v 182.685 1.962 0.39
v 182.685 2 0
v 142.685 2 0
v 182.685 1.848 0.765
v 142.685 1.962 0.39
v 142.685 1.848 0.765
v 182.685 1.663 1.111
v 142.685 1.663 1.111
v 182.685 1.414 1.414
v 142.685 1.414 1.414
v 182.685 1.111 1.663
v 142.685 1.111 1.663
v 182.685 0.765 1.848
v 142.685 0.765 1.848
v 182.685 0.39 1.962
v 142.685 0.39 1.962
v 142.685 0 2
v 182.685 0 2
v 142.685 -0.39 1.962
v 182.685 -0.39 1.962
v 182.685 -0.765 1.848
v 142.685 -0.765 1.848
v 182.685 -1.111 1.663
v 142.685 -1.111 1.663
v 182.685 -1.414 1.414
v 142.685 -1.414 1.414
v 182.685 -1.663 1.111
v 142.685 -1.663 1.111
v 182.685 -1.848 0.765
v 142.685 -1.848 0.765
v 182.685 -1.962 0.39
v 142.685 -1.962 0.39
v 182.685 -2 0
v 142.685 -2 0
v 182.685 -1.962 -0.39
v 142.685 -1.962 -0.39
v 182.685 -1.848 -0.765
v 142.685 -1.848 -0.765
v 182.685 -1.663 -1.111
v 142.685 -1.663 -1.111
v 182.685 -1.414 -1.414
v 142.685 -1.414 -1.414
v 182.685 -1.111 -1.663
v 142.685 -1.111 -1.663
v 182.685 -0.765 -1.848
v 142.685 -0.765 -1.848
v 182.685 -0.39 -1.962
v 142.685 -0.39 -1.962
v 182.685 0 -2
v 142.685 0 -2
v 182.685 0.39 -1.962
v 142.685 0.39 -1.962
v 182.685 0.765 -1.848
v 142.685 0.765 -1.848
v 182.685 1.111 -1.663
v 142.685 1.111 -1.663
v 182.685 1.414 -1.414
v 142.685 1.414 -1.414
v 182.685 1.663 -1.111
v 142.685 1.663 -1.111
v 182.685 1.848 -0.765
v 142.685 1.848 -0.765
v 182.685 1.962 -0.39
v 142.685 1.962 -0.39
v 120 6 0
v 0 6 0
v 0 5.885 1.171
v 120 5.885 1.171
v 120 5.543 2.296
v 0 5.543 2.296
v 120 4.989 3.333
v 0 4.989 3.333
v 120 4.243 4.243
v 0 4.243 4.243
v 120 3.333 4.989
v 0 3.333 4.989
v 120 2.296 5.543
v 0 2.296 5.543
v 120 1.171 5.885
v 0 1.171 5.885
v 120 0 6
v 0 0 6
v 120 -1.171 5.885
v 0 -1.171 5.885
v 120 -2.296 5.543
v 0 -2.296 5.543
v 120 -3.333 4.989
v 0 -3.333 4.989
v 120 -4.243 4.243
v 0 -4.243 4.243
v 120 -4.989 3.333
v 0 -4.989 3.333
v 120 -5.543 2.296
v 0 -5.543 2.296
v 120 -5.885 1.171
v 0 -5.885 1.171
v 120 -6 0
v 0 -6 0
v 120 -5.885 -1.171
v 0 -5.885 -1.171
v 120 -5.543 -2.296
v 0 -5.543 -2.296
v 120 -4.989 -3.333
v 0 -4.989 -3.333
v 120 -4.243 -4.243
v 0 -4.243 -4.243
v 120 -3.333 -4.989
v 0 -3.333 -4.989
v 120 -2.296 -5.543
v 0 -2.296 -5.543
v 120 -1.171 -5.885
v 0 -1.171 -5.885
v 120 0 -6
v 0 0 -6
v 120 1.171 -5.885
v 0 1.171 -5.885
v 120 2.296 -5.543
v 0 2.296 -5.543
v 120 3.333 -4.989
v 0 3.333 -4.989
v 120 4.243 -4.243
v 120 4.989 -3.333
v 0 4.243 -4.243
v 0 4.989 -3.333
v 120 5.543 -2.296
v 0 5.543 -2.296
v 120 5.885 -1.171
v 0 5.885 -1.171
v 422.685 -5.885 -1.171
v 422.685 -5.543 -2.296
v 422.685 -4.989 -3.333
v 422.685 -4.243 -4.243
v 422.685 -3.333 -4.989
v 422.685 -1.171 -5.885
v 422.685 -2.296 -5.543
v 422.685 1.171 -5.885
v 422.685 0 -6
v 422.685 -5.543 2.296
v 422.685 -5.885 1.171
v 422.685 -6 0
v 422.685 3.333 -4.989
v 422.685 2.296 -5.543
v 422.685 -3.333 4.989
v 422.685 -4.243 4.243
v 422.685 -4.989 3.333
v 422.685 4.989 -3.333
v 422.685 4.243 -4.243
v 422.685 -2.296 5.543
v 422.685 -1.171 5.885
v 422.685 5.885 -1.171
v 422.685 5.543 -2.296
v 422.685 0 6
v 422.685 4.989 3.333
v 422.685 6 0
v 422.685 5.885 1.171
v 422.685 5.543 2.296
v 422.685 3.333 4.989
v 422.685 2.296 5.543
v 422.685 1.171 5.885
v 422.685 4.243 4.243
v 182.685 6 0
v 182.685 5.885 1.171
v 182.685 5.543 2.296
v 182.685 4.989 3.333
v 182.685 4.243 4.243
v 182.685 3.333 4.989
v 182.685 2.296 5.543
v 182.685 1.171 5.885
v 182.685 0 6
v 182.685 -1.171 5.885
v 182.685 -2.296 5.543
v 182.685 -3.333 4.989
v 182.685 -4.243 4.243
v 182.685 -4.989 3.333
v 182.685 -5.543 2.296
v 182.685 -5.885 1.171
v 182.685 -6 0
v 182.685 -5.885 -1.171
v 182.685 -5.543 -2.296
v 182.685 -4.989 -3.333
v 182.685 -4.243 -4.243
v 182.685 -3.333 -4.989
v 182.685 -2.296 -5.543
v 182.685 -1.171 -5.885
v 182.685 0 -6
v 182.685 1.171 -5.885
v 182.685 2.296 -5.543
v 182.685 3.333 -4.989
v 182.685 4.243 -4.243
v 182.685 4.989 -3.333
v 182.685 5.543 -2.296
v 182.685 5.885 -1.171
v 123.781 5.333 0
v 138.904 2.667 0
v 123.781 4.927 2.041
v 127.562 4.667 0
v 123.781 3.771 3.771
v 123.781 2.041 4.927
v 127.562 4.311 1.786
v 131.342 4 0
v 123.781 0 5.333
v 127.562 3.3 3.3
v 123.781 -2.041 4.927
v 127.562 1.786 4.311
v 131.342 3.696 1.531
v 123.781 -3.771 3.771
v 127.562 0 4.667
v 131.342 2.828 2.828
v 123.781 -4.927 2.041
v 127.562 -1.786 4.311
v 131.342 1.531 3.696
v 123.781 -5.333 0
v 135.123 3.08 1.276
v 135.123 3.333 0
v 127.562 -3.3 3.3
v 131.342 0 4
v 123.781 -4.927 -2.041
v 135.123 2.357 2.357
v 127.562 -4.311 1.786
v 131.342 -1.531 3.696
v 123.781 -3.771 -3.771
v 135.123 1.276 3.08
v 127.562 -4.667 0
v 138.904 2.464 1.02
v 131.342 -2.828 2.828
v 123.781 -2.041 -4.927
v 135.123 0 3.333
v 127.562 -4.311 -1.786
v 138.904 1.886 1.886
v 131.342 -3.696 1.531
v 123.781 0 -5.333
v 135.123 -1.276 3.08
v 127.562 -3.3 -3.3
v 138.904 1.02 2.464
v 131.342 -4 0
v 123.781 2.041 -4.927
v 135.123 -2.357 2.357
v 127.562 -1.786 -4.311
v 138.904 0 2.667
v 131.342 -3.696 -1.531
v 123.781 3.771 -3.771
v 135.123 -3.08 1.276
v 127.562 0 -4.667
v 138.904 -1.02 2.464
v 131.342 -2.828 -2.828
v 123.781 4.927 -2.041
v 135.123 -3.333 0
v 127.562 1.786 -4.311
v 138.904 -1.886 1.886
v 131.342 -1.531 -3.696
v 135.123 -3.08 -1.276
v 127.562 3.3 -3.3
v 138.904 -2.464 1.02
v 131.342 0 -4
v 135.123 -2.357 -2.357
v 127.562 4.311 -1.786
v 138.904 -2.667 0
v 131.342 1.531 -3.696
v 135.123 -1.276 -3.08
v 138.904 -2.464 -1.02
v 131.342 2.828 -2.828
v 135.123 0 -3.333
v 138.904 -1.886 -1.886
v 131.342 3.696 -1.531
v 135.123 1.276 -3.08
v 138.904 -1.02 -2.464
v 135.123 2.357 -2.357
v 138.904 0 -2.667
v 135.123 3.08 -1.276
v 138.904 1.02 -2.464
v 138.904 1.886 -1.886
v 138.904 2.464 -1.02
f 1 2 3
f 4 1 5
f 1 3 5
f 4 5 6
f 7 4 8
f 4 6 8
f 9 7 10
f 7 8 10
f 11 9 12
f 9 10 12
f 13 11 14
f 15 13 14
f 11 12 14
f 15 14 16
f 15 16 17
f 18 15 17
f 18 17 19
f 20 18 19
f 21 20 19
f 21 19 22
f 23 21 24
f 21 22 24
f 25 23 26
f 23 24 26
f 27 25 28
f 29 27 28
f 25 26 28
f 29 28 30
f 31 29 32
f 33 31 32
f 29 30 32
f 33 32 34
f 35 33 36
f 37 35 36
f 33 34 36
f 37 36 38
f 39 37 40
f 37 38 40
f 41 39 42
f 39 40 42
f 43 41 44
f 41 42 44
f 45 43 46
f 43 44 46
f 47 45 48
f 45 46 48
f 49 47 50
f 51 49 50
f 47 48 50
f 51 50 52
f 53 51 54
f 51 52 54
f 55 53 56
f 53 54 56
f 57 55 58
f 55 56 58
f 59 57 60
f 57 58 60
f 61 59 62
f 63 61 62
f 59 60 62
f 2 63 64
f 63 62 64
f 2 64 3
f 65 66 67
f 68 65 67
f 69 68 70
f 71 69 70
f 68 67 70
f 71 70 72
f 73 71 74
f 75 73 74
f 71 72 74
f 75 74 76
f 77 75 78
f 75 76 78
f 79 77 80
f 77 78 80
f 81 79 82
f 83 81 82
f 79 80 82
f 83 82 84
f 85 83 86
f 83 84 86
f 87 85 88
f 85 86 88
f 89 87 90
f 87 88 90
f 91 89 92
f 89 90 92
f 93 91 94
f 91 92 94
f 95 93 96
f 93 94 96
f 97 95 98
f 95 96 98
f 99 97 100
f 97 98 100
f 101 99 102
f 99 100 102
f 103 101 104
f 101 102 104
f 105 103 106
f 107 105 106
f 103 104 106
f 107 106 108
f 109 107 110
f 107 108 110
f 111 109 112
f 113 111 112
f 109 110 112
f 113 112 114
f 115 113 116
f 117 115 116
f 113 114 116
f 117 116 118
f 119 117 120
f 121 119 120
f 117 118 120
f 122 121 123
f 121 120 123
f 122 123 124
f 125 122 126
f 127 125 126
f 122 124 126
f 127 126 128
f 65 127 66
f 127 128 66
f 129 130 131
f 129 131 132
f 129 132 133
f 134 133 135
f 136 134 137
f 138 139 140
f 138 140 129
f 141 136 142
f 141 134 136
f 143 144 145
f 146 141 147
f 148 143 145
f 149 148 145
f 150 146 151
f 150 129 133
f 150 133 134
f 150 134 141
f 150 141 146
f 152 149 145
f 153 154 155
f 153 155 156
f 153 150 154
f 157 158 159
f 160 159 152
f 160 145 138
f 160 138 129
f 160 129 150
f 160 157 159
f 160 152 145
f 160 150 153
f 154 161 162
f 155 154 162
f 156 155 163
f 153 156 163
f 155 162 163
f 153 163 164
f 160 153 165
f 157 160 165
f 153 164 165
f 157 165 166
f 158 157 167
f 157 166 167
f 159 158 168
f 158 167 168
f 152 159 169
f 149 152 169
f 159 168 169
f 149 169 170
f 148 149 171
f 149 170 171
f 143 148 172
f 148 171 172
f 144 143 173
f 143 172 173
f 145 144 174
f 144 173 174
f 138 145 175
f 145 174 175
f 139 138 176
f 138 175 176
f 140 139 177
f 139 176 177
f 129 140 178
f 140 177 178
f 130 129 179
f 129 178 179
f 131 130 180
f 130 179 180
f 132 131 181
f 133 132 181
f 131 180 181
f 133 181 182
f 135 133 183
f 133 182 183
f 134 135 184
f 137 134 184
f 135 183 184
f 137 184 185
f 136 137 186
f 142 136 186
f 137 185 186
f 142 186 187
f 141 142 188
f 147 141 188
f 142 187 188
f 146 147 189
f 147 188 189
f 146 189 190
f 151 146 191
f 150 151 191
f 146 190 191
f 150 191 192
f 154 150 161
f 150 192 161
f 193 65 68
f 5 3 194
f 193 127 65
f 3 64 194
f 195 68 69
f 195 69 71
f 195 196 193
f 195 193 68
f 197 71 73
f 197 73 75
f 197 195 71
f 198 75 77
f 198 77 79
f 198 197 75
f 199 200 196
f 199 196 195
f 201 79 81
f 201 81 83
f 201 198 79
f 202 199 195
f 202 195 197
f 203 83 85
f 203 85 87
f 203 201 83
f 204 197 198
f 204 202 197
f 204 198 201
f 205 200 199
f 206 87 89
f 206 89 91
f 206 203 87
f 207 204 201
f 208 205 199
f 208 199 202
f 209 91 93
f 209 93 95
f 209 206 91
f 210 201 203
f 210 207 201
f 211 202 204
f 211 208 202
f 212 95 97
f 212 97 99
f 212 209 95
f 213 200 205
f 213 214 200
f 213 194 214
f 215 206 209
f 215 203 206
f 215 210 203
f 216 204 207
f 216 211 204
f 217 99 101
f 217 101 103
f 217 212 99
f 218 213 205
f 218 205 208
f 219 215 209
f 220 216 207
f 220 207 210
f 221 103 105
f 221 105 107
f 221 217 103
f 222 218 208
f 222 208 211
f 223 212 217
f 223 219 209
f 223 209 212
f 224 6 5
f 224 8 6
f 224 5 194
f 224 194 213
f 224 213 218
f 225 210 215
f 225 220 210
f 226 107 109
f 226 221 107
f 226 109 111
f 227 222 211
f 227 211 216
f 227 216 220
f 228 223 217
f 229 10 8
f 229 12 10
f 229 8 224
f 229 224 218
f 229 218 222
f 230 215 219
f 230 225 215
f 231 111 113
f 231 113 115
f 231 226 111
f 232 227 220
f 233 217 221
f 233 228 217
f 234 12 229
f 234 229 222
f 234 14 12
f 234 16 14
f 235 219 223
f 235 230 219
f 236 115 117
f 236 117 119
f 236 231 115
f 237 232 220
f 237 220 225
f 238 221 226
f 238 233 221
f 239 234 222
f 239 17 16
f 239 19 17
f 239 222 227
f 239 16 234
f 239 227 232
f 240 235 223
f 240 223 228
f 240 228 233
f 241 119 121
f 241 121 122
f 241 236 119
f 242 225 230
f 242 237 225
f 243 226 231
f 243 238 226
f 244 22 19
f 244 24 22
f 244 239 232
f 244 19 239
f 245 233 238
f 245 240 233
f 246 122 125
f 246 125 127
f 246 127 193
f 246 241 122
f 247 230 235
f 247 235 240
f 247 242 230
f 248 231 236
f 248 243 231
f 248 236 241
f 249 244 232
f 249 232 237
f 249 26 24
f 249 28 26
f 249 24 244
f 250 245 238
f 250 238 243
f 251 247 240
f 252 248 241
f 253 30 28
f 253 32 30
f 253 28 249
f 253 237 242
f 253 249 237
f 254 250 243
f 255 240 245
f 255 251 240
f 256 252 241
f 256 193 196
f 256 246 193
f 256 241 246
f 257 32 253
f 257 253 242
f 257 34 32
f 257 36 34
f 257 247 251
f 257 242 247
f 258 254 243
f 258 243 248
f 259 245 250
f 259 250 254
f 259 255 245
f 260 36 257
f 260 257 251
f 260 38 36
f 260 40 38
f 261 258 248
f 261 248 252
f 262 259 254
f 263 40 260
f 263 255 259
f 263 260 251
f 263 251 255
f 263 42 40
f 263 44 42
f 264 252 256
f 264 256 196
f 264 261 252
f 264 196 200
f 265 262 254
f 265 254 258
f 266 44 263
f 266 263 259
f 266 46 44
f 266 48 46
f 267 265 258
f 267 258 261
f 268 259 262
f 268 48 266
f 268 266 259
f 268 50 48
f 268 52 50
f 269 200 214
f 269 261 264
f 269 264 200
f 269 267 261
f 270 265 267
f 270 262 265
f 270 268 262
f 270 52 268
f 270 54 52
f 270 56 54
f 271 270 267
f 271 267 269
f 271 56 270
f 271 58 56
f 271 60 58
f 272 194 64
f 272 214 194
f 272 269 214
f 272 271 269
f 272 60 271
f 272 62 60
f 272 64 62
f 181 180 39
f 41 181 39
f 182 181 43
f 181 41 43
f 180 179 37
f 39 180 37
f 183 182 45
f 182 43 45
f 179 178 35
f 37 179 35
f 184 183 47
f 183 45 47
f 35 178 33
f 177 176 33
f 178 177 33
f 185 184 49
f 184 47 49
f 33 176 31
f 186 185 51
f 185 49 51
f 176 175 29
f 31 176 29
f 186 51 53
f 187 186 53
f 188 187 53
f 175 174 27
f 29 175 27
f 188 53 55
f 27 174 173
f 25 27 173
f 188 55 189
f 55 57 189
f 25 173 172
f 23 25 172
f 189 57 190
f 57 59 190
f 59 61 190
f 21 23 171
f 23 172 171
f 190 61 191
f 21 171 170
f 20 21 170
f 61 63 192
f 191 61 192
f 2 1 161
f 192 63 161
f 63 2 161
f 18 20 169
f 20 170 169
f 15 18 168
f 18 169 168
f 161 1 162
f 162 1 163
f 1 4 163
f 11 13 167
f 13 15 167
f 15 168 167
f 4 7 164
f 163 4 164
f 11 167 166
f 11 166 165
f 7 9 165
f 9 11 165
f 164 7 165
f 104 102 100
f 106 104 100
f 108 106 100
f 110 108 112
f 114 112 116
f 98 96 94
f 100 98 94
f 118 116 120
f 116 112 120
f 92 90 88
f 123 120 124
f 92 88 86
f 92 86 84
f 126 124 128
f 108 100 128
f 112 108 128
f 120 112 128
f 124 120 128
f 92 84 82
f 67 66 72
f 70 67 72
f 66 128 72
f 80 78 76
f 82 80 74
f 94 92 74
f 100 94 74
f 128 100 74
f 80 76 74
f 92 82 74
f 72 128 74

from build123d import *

# Parameters (mm, degrees)
F0_R      = 6
F1_DEPTH  = 120
F1_FACE_R = 6
F3_R      = 2
F5_R      = 2
F6_DEPTH  = 40
F8_R      = 6
F9_DEPTH  = 240


with BuildPart() as f1:
    # F0 (on Right) → F1 (new body)
    with BuildSketch(Plane.YZ):
        Circle(F0_R)
    extrude(amount=F1_DEPTH)

    # F1_face (on face) → F4 section 0
    with BuildSketch(Plane.YZ.offset(120)):
        Circle(F1_FACE_R)
    # F3 (on offset) → F4 section 1
    with BuildSketch(Plane.YZ.offset(142.685)):
        Circle(F3_R)
    loft()

    # F5 (on offset) → F6 (join)
    with BuildSketch(Plane.YZ.offset(142.685)):
        Circle(F5_R)
    extrude(amount=F6_DEPTH)

    # F8 (on offset) → F9 (join)
    with BuildSketch(Plane.YZ.offset(182.685)):
        Circle(F8_R)
    extrude(amount=F9_DEPTH)


solid = f1.part
